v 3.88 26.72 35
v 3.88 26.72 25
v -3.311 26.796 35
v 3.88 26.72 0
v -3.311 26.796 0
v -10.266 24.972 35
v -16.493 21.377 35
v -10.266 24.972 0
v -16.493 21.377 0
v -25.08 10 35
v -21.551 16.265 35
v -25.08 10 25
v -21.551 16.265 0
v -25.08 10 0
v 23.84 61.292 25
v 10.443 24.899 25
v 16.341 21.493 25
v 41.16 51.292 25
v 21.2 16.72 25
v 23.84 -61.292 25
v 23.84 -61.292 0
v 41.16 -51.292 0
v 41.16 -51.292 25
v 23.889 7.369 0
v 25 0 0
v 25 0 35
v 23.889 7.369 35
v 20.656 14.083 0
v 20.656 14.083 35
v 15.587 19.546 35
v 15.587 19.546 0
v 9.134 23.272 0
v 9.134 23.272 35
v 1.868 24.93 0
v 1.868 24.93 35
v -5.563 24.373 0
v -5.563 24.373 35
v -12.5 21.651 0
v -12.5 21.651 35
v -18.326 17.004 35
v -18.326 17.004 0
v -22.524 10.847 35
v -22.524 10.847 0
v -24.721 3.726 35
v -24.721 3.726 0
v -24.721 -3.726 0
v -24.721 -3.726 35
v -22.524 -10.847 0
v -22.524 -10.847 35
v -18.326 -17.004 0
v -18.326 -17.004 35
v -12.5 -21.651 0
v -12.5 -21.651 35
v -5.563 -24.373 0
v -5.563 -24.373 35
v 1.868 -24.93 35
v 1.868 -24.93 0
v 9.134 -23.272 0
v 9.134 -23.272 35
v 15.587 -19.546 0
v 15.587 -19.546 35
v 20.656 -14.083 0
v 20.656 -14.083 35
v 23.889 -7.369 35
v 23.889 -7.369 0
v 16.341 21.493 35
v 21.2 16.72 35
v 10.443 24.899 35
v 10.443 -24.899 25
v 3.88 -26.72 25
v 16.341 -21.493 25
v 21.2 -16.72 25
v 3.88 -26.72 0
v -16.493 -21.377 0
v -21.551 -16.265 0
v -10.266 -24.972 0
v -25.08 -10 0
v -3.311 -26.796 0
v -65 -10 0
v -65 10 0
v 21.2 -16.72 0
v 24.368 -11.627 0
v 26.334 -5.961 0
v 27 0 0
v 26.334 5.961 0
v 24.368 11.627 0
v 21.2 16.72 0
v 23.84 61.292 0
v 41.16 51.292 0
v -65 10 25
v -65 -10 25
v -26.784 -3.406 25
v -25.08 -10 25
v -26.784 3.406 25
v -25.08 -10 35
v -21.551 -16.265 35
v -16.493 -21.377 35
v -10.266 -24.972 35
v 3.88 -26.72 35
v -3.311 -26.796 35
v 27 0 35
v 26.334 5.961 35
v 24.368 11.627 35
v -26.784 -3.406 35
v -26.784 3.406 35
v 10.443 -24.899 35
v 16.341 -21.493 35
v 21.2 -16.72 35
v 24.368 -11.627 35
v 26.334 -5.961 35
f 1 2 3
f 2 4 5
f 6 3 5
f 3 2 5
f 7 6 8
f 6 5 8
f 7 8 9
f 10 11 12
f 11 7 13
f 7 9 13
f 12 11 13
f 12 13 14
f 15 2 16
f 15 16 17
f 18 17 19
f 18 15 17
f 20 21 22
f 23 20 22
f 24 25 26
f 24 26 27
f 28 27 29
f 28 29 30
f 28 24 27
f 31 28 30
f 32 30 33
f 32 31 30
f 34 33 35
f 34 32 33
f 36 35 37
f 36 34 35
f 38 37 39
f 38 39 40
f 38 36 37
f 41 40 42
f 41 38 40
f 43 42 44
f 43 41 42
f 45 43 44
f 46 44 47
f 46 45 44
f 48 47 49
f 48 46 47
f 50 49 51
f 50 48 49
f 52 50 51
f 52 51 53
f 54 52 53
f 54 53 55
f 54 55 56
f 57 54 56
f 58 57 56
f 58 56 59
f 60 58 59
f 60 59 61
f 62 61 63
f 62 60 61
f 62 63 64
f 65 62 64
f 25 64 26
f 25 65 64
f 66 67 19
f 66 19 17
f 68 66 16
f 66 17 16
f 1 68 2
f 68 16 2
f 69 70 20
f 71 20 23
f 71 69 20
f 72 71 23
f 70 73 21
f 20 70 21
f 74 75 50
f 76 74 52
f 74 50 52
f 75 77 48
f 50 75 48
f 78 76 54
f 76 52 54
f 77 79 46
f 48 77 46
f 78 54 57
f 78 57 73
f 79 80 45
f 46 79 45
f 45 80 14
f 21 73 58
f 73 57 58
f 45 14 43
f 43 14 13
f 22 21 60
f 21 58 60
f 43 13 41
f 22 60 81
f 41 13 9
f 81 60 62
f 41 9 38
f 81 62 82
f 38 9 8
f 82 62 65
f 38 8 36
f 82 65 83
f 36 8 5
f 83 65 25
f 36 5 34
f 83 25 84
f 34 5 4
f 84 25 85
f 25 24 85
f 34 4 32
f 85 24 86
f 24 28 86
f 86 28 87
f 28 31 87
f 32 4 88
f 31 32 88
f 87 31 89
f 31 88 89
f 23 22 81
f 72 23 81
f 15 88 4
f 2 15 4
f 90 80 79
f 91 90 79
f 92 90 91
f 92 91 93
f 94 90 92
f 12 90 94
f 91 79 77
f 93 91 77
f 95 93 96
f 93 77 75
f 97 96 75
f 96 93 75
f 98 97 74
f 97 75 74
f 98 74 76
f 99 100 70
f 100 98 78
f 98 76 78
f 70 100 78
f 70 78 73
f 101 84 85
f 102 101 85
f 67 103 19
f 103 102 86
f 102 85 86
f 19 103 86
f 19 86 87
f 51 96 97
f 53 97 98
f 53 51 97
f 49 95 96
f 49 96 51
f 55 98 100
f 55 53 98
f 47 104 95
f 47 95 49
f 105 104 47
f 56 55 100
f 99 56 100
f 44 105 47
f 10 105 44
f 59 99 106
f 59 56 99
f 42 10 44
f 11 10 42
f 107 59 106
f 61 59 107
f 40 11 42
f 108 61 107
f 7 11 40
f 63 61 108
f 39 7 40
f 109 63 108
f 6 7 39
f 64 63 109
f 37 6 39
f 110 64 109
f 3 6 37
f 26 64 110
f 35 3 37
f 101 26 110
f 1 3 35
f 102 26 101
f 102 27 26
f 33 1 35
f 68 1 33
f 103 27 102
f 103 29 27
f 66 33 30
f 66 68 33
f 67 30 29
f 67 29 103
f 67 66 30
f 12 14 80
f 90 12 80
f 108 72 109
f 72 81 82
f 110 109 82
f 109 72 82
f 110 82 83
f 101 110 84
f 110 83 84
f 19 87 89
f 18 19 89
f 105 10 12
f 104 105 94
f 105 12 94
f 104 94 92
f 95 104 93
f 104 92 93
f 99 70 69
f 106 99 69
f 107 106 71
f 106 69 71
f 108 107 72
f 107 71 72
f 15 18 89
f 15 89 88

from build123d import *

# Parameters (mm, degrees)
F0_R     = 25
F1_DEPTH = 35
F2_DEPTH = 25


with BuildPart() as f1:
    # F0 (on Top) → F1 (new body)
    with BuildSketch(Plane.XY):
        with BuildLine():
            ThreePointArc((21.20019, -16.719807), (25.508872, -8.848584), (27, 0))
            ThreePointArc((27, 0), (25.508872, 8.848584), (21.20019, 16.719807))
            ThreePointArc((21.20019, 16.719807), (13.5, 23.382686), (3.879682, 26.719807))
            ThreePointArc((3.879682, 26.719807), (-13.5, 23.382686), (-25.079872, 10))
            ThreePointArc((-25.079872, 10), (-27, 0), (-25.079872, -10))
            ThreePointArc((-25.079872, -10), (-13.5, -23.382686), (3.879682, -26.719807))
            ThreePointArc((3.879682, -26.719807), (13.5, -23.382686), (21.20019, -16.719807))
        make_face()
        Circle(F0_R, mode=Mode.SUBTRACT)
    extrude(amount=F1_DEPTH)

    # F0 (on Top) → F2 (join)
    with BuildSketch(Plane.XY):
        with BuildLine():
            ThreePointArc((-25.079872, -10), (-27, 0), (-25.079872, 10))
            Line((-25.079872, 10), (-65, 10))
            Line((-65, 10), (-65, -10))
            Line((-65, -10), (-25.079872, -10))
        make_face()
        with BuildLine():
            Line((41.160254, -51.291651), (21.20019, -16.719807))
            ThreePointArc((21.20019, -16.719807), (13.5, -23.382686), (3.879682, -26.719807))
            Line((3.879682, -26.719807), (23.839746, -61.291651))
            Line((23.839746, -61.291651), (41.160254, -51.291651))
        make_face()
        with BuildLine():
            ThreePointArc((3.879682, 26.719807), (13.5, 23.382686), (21.20019, 16.719807))
            Line((21.20019, 16.719807), (41.160254, 51.291651))
            Line((41.160254, 51.291651), (23.839746, 61.291651))
            Line((23.839746, 61.291651), (3.879682, 26.719807))
        make_face()
    extrude(amount=F2_DEPTH)


solid = f1.part
